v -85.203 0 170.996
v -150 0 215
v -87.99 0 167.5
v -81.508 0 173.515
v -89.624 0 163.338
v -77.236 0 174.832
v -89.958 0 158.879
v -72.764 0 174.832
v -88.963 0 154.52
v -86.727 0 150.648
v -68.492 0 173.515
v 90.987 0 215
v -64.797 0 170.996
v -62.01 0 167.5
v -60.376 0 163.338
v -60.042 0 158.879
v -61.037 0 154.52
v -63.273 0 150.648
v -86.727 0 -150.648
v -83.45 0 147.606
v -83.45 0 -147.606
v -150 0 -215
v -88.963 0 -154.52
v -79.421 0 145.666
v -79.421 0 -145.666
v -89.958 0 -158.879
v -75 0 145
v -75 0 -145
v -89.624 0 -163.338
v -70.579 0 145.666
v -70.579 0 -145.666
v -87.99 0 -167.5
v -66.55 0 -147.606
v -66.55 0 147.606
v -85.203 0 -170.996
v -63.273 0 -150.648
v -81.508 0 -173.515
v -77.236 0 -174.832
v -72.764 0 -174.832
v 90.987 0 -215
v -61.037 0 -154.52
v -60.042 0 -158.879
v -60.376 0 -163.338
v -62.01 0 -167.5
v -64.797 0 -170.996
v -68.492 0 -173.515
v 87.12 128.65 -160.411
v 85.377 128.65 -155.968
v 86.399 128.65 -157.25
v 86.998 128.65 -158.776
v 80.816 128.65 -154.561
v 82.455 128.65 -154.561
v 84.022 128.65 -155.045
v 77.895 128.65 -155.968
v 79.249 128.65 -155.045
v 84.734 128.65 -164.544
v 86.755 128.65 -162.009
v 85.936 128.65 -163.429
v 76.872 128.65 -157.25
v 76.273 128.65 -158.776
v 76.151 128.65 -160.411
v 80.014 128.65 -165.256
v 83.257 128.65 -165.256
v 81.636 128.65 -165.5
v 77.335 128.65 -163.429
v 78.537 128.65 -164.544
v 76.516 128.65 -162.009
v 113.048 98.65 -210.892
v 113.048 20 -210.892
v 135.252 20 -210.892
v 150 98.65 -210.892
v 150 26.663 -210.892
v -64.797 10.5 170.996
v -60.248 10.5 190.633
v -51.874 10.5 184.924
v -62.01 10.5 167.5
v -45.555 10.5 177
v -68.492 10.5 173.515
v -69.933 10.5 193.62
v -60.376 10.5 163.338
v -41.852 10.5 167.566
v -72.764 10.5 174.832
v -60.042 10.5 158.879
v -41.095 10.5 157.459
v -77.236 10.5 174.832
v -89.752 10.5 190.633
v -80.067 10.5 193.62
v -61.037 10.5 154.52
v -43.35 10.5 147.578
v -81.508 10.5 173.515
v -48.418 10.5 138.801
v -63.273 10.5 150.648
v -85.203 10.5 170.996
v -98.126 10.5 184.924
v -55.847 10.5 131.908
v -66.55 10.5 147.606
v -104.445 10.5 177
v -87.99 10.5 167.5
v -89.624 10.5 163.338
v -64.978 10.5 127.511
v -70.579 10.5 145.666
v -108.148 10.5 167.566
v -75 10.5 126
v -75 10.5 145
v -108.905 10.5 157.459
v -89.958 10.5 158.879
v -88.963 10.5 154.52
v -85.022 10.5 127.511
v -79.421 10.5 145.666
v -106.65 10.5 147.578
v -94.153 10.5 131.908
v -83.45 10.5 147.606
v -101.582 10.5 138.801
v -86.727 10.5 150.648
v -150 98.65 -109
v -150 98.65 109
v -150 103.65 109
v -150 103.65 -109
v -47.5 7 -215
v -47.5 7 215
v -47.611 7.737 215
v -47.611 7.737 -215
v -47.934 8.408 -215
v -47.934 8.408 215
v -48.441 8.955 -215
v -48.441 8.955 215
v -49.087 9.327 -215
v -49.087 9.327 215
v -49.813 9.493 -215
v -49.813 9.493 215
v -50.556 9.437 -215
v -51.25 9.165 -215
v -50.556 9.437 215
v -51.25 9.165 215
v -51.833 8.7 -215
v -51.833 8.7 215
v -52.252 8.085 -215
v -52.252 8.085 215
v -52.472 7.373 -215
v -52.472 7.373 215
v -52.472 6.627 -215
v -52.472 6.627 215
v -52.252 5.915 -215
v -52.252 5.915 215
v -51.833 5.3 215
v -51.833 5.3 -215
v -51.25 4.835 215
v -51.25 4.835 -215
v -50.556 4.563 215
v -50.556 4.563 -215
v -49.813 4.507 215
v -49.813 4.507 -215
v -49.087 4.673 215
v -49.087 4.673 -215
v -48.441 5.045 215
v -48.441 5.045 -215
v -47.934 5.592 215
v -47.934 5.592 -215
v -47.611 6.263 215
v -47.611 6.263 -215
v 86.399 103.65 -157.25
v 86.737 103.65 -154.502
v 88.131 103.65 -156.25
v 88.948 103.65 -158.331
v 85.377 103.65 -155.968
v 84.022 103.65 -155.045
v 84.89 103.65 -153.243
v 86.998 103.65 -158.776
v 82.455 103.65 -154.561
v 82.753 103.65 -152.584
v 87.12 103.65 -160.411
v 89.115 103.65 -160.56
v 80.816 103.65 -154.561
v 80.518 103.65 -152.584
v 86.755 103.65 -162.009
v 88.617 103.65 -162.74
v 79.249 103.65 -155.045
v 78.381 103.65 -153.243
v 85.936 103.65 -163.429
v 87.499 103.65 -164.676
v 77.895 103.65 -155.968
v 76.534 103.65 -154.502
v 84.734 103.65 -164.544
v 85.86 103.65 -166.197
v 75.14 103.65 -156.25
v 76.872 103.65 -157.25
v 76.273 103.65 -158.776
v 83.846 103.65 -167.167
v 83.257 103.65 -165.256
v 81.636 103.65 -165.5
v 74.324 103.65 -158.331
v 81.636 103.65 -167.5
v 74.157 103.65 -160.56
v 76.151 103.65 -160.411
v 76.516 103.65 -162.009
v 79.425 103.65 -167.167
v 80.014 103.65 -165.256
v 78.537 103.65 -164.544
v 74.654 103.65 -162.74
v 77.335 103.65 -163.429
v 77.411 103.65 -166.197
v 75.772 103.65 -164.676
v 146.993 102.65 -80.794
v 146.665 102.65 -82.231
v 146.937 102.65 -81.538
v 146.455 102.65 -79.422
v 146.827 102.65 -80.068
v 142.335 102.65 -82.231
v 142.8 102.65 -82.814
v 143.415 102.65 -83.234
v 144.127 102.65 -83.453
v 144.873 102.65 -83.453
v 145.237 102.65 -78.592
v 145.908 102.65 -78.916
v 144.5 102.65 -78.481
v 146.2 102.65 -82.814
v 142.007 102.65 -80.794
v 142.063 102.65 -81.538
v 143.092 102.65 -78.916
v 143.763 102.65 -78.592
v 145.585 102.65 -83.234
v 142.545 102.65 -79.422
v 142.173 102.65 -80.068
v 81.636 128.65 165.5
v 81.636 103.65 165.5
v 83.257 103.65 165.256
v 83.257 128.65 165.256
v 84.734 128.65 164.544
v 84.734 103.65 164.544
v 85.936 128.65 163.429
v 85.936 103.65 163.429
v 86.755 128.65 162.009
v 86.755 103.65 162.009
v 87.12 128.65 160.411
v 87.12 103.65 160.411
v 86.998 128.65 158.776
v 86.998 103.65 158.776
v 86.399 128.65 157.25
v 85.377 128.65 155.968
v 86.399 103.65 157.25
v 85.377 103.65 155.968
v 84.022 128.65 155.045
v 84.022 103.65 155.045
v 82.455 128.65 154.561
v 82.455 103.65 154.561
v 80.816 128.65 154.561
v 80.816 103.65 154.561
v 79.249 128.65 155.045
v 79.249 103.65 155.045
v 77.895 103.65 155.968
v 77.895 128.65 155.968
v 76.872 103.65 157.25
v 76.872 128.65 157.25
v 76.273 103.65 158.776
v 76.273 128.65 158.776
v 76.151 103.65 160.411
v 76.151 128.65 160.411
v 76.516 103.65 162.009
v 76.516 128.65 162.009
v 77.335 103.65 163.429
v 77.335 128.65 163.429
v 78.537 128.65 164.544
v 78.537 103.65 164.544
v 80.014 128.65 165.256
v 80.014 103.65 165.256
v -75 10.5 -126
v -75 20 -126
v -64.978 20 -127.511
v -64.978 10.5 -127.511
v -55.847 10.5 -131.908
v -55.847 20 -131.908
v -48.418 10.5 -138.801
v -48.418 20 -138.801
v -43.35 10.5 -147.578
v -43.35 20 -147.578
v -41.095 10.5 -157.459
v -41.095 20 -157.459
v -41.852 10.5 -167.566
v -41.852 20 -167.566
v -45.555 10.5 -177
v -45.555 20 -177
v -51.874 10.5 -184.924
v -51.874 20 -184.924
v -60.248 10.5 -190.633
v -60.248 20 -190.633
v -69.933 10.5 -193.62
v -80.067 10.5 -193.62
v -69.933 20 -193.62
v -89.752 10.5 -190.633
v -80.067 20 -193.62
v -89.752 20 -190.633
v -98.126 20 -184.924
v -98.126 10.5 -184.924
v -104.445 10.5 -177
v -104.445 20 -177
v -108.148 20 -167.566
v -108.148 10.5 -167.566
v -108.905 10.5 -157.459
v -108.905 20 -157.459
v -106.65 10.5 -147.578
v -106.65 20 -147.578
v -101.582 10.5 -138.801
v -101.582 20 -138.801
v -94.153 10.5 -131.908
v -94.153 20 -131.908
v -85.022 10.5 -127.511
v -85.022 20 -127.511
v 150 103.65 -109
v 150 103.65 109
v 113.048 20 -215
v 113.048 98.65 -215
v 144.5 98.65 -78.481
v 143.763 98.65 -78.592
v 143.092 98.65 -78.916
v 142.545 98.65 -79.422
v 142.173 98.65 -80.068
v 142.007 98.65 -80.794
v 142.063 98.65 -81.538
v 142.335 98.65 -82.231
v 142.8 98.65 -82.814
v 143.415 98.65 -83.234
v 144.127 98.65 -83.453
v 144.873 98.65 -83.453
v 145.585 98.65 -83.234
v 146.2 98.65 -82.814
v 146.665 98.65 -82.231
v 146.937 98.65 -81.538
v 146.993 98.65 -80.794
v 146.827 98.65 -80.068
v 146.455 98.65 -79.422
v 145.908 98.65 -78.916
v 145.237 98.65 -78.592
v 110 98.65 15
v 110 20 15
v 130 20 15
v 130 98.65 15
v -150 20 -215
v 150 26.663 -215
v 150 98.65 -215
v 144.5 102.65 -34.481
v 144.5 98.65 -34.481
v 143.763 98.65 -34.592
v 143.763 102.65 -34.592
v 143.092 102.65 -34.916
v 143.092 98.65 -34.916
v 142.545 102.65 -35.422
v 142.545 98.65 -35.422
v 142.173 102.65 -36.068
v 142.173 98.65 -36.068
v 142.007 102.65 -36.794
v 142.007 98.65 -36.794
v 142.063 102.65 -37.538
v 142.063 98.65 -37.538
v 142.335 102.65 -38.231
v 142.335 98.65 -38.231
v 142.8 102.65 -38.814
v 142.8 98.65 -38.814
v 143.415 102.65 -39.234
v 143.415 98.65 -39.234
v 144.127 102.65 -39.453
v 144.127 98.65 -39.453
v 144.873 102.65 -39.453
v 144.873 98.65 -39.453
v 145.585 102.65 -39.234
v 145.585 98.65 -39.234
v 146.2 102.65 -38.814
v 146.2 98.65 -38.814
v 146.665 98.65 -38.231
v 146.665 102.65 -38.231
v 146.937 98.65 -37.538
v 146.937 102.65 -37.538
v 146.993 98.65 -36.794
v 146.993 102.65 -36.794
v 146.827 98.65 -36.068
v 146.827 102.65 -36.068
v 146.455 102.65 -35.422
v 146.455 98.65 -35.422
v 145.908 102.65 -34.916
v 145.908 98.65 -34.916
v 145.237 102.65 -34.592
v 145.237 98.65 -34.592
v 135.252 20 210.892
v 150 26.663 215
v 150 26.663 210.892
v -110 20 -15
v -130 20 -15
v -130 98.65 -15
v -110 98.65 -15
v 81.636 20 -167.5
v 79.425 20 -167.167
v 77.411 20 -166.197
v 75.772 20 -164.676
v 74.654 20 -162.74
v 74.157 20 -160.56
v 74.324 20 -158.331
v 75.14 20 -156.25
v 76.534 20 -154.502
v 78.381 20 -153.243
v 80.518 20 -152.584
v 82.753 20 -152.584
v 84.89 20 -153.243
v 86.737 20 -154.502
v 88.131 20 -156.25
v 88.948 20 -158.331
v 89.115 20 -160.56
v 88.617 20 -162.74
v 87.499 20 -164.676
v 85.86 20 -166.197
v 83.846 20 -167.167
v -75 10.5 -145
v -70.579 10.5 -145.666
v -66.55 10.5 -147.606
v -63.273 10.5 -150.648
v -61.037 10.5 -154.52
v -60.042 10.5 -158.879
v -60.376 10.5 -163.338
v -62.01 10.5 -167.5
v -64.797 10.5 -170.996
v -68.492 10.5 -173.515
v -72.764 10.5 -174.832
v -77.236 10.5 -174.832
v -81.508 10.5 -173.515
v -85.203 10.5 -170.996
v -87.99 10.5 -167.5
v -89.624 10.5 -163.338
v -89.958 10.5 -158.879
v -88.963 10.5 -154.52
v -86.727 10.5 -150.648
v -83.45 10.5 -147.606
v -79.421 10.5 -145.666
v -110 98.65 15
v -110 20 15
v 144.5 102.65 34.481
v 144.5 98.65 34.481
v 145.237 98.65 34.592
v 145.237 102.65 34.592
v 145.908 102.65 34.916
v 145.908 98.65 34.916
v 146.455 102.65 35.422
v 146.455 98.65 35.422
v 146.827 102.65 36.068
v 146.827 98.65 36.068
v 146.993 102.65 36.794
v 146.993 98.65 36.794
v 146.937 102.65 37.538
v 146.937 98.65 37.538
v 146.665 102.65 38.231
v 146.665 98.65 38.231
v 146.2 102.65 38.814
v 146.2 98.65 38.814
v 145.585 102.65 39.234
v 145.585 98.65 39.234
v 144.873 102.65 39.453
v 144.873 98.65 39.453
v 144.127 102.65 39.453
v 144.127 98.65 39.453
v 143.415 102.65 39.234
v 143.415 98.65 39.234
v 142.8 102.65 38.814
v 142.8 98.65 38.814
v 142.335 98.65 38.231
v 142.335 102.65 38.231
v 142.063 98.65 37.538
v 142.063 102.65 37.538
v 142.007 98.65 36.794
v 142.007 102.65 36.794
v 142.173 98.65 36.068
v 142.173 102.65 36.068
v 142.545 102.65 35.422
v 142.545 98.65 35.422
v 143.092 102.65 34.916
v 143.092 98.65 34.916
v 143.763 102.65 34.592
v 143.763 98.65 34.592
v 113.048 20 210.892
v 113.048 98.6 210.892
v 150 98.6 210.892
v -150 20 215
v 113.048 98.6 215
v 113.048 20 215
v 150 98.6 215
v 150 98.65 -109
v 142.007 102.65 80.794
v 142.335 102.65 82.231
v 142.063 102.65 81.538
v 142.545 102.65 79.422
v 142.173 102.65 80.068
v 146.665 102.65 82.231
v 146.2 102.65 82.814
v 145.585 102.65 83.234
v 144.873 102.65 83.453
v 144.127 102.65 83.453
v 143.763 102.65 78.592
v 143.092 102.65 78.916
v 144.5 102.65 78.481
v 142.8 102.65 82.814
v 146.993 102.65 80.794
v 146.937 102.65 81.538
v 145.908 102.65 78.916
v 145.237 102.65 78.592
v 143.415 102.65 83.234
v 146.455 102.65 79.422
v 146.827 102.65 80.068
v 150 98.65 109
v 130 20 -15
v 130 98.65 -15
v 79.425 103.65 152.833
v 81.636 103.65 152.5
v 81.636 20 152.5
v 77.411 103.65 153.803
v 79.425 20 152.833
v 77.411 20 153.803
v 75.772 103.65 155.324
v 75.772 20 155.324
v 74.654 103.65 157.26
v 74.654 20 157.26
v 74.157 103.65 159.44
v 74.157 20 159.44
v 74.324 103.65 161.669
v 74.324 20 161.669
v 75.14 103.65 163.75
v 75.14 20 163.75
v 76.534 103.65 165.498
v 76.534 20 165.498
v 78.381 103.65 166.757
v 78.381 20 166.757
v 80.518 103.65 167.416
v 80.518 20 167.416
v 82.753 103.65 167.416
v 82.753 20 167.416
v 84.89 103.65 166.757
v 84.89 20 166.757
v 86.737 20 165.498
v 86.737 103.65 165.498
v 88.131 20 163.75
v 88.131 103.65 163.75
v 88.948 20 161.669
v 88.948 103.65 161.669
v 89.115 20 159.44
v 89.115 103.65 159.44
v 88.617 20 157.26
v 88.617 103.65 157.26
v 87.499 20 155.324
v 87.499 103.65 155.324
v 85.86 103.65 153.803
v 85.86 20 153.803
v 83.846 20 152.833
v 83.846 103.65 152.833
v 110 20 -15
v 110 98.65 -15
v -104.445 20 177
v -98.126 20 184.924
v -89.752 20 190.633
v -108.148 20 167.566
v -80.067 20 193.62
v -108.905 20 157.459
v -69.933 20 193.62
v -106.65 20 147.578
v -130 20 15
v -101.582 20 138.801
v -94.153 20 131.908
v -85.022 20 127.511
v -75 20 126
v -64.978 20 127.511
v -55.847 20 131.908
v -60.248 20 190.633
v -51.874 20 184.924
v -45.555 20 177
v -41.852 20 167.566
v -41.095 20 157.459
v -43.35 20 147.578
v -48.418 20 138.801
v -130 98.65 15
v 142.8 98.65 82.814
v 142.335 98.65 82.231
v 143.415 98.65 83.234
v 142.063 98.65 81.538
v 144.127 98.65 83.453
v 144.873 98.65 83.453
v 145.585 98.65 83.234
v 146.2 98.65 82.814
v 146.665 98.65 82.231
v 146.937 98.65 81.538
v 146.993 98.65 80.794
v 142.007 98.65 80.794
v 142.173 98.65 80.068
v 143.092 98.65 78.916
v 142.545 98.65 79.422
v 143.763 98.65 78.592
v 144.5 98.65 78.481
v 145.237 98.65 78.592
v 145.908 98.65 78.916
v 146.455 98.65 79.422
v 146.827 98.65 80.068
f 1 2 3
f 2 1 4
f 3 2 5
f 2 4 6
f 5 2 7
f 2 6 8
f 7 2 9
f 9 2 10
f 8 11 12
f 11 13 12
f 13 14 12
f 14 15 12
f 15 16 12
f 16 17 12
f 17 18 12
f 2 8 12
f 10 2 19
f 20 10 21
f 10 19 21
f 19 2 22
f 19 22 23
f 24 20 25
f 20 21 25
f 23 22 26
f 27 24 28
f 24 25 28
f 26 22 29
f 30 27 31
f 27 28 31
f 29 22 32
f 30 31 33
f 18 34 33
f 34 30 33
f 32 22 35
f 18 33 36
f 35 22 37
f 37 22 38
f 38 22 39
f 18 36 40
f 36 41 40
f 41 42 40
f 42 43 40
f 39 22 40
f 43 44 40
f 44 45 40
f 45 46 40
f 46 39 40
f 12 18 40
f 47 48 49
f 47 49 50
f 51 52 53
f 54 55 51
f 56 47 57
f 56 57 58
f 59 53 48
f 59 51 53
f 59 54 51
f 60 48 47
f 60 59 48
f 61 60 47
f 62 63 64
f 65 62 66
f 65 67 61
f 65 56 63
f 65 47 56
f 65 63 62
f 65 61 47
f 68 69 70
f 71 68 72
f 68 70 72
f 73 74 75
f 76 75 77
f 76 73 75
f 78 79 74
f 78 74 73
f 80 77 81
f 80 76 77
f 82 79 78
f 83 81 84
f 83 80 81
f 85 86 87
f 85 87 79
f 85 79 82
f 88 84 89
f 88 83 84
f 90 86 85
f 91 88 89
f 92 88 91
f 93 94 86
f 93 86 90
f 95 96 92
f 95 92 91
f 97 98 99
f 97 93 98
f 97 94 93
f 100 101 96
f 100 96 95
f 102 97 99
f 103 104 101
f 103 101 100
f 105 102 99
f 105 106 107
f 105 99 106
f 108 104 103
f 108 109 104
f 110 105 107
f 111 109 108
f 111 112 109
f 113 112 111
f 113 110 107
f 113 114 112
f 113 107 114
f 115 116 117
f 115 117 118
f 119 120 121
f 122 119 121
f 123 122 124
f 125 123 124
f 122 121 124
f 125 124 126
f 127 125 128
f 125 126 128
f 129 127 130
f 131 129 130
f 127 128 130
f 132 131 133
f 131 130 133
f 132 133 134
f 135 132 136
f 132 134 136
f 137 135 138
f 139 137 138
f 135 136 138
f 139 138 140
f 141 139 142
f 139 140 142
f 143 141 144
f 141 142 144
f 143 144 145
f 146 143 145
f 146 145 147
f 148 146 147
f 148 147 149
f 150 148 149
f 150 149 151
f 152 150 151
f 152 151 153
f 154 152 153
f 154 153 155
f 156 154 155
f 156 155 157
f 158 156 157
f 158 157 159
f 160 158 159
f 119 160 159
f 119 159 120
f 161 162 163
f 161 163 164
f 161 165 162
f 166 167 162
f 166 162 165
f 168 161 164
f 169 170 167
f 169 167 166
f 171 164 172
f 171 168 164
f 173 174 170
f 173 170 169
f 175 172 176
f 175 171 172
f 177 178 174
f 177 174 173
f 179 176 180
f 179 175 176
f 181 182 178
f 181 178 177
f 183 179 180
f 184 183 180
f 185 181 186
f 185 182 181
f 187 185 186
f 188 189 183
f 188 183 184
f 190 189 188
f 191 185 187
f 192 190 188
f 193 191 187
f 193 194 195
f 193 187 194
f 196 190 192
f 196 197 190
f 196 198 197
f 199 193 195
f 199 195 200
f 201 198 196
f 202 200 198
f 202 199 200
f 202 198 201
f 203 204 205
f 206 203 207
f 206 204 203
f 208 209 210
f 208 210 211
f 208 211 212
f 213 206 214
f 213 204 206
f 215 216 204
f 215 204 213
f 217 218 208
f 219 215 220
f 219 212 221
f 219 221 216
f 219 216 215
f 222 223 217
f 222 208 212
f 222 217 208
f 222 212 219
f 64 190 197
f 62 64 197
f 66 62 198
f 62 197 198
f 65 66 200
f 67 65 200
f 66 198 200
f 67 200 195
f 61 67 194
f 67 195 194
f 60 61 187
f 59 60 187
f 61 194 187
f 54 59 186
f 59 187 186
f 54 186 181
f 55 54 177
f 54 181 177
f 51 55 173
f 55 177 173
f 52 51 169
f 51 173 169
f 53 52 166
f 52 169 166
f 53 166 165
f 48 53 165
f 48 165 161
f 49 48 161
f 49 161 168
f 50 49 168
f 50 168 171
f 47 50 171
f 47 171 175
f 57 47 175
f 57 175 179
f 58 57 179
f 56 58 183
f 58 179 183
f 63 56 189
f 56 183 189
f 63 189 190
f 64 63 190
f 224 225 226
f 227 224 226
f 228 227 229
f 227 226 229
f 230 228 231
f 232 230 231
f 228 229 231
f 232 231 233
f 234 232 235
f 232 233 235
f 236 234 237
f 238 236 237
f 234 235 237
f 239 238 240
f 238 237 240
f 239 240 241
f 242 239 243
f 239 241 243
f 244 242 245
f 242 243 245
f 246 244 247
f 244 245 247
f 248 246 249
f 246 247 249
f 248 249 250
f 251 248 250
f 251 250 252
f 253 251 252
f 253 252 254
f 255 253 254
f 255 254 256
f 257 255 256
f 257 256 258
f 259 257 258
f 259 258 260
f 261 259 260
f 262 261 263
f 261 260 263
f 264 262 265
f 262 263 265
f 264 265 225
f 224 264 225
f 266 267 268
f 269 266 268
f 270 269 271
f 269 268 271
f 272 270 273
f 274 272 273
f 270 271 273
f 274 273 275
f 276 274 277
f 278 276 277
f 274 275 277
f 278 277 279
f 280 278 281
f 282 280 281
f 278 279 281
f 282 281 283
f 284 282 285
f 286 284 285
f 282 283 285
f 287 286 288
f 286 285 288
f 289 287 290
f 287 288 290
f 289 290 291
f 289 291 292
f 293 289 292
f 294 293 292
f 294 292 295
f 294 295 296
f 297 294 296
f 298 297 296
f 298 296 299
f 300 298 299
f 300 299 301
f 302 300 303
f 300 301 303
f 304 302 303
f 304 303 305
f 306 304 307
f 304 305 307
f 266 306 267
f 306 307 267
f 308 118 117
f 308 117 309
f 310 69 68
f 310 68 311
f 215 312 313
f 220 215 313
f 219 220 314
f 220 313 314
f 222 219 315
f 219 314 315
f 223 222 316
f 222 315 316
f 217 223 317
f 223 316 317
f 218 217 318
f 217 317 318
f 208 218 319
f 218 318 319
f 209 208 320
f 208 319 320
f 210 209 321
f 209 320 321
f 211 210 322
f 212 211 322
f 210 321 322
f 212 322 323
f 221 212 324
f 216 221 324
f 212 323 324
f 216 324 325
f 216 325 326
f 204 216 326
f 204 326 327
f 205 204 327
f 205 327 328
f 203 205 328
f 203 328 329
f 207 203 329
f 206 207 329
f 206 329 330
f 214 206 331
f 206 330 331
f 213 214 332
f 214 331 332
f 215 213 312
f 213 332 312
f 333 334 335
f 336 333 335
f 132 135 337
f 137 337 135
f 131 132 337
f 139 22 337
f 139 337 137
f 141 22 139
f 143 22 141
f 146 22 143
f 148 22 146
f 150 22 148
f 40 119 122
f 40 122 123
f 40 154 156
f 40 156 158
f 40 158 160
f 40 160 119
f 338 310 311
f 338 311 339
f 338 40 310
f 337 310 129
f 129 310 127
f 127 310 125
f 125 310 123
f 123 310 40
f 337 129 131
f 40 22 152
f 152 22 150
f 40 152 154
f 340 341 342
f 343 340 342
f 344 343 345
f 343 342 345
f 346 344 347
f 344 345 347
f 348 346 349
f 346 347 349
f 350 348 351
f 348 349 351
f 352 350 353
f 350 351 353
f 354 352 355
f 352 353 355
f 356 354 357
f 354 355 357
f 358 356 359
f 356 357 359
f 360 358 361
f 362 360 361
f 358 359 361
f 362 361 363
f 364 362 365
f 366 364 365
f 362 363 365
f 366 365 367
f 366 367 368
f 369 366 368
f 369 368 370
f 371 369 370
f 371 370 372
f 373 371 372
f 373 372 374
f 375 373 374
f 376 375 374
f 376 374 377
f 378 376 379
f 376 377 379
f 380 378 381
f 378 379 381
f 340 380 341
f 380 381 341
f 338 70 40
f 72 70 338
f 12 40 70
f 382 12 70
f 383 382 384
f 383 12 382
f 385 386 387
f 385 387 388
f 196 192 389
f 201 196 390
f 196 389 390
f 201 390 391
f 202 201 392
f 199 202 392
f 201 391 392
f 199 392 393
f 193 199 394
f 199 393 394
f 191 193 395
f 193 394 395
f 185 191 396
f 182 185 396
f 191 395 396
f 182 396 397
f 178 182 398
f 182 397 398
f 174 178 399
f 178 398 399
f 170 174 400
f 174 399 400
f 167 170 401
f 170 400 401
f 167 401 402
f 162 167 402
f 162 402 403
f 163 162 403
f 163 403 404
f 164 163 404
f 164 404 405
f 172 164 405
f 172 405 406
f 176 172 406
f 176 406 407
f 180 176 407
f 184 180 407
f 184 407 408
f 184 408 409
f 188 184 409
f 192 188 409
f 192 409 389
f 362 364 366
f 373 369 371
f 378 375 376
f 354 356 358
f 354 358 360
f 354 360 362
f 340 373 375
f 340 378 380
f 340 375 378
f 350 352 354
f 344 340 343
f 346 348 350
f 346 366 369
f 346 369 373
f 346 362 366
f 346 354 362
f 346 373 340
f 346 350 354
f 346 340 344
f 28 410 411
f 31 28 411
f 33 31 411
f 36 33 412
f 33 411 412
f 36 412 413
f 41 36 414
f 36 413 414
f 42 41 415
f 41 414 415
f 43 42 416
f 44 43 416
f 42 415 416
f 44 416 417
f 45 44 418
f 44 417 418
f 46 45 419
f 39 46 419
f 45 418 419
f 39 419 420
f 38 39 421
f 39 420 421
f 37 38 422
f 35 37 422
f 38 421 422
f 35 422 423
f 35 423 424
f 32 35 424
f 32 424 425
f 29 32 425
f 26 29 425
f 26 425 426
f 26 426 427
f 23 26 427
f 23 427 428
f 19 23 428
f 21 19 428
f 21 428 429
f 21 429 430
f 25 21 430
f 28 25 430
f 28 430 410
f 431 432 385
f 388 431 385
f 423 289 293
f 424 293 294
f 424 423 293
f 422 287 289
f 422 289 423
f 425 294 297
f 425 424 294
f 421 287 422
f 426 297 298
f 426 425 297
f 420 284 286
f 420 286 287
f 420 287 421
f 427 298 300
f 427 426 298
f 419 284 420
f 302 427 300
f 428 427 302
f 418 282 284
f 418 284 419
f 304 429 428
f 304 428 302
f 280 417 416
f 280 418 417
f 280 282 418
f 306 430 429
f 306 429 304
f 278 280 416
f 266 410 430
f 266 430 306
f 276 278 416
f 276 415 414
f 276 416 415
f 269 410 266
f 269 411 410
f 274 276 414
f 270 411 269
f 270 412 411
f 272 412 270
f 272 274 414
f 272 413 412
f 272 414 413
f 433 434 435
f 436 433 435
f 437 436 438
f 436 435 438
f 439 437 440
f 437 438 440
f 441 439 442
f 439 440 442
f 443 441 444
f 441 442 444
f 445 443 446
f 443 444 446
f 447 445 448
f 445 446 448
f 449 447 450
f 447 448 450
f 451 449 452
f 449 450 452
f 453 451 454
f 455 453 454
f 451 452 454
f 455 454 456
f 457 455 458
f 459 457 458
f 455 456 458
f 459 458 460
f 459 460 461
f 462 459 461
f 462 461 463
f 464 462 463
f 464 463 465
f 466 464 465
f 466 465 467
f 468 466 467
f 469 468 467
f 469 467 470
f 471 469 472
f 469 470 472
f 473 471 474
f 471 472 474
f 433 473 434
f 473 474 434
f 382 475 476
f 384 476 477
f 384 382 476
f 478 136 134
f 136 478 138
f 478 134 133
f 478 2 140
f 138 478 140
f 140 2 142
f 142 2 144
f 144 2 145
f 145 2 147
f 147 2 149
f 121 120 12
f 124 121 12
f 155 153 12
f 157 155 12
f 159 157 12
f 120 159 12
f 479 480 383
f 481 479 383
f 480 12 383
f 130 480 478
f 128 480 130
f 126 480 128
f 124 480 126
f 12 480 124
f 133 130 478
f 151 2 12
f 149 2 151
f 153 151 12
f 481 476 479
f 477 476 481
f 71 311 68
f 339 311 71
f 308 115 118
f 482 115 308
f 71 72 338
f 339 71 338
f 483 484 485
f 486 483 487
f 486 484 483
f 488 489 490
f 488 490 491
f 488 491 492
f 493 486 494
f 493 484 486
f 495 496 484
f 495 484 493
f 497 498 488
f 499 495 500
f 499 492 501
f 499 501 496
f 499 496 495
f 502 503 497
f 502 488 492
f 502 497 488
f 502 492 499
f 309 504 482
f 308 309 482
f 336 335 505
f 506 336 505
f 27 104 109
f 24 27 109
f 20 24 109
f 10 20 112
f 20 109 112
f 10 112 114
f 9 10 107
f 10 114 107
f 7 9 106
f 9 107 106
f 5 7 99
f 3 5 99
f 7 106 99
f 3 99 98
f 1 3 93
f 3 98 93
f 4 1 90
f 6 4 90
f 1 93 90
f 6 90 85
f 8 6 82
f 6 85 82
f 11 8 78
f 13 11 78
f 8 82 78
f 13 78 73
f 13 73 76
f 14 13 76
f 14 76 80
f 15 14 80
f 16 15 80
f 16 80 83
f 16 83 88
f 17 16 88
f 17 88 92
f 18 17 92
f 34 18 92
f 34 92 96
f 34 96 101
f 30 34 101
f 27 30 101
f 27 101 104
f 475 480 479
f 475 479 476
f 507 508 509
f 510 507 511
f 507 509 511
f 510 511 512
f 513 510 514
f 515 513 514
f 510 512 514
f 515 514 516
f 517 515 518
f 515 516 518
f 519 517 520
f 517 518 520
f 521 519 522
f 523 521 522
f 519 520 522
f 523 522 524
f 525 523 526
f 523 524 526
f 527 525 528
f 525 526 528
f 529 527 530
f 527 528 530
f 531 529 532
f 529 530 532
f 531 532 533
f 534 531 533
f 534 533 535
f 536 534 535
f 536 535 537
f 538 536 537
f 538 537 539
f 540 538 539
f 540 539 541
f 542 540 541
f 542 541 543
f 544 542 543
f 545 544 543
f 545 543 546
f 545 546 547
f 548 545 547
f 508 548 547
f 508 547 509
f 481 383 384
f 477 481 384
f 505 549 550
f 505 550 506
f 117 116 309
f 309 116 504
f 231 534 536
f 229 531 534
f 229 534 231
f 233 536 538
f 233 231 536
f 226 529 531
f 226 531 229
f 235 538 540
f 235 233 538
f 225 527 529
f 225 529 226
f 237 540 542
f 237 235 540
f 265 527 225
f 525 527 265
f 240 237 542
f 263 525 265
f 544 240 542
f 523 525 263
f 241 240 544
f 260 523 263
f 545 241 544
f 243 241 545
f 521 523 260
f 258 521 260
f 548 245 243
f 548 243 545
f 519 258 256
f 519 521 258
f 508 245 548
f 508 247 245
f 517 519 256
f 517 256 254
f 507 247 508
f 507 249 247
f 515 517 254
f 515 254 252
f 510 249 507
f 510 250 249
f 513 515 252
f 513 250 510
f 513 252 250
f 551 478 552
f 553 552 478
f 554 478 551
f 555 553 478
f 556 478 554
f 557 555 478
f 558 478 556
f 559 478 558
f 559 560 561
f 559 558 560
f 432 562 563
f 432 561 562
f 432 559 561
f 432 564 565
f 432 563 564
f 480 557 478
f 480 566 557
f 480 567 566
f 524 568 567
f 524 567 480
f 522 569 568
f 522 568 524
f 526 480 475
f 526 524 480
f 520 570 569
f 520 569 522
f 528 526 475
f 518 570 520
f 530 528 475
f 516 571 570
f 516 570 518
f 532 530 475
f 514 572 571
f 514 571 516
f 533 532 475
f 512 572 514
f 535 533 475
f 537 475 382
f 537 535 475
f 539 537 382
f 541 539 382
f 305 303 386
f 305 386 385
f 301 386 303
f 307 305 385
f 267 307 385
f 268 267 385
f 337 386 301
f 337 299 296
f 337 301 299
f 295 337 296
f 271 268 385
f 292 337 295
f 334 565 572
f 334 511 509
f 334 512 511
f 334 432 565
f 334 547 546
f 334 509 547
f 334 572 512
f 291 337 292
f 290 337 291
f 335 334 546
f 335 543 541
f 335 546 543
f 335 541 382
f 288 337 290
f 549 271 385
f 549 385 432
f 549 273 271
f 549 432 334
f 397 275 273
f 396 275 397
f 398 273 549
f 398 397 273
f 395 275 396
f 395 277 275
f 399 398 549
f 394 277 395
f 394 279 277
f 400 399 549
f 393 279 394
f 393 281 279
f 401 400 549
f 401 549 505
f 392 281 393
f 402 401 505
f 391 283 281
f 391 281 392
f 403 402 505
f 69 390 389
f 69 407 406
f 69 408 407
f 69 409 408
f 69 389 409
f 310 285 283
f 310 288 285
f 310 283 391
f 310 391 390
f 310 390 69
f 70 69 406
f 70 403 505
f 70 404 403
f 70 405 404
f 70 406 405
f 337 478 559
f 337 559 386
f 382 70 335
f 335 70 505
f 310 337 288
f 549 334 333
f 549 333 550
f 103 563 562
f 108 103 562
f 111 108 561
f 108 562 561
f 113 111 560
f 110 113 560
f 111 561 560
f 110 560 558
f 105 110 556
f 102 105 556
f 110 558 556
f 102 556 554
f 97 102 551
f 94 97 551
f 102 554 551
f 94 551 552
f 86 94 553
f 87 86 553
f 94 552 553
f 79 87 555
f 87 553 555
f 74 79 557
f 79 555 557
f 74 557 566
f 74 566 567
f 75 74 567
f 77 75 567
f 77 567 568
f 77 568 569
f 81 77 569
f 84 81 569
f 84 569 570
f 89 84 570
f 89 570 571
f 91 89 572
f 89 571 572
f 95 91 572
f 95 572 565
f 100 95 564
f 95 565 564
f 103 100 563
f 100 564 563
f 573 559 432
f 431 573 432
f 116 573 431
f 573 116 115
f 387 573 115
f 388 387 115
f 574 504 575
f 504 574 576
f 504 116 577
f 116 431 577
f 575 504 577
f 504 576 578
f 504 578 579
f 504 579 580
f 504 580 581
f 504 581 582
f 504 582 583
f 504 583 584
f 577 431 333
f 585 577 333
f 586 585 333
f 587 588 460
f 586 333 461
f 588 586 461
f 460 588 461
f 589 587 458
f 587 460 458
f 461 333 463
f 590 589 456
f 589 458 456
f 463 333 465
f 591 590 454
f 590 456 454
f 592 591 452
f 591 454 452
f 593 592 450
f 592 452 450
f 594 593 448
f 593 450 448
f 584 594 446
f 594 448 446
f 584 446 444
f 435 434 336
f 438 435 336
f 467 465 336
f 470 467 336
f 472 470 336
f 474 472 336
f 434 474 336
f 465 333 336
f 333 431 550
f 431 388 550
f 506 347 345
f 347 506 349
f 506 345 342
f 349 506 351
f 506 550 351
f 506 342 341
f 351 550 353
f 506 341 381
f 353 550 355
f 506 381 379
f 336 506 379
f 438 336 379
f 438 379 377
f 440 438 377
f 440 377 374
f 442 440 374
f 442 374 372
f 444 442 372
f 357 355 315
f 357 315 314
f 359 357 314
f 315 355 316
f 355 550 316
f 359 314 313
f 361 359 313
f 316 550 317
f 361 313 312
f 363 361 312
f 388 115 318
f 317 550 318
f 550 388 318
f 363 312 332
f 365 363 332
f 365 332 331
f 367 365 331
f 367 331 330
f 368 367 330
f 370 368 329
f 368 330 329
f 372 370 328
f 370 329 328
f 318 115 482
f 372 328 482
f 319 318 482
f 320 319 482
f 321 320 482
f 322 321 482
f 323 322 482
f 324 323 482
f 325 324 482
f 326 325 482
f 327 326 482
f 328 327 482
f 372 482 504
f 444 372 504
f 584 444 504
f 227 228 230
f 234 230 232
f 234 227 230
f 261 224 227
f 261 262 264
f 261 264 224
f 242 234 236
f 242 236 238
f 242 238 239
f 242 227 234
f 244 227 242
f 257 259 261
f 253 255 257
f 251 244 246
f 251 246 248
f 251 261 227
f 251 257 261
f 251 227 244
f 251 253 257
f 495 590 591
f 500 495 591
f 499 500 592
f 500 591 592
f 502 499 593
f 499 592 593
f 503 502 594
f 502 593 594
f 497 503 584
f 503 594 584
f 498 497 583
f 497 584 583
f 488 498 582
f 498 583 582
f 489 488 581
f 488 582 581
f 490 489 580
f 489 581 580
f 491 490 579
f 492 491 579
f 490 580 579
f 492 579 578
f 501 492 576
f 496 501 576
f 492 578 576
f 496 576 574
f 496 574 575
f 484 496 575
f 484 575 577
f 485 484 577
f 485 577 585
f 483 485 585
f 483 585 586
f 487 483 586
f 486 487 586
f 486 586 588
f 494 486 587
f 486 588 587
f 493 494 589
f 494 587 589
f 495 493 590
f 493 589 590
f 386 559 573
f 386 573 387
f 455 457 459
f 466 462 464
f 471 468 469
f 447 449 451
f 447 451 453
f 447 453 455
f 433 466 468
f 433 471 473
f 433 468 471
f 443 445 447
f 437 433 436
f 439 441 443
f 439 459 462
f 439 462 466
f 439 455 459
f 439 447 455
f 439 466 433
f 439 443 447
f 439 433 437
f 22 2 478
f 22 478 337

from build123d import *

# Parameters (mm, degrees)
SKETCH2_W           = 300
SKETCH2_H           = 430
BOSS_EXTRUDE1_DEPTH = 20
SKETCH3_R           = 15
CUT_EXTRUDE1_DEPTH  = 20
SKETCH4_R           = 34
CUT_EXTRUDE2_DEPTH  = 9.5
SKETCH5_R           = 7.5
BOSS_EXTRUDE2_DEPTH = 108.65
CUT_EXTRUDE4_START  = -25
SKETCH6_R           = 7.5
SKETCH6_R_2         = 5.5
CUT_EXTRUDE4_DEPTH  = 25
SKETCH7_W           = 20
SKETCH7_H           = 30
BOSS_EXTRUDE3_DEPTH = 78.65
SKETCH8_W           = 300
SKETCH8_H           = 218
BOSS_EXTRUDE4_DEPTH = 5
SKETCH12_R          = 2.5
CUT_EXTRUDE7_DEPTH  = 4
SKETCH13_W          = 36.95235035
SKETCH13_H          = 4.108205057
BOSS_EXTRUDE5_DEPTH = 78.6
SKETCH15_W          = 36.95235035
SKETCH15_H          = 4.108205057
BOSS_EXTRUDE6_DEPTH = 78.65
CUT_EXTRUDE8_DEPTH  = 474.234426579
SKETCH17_R          = 2.5
CUT_EXTRUDE9_DEPTH  = 474.234426579


with BuildPart() as part:
    # Sketch2 → Boss-Extrude1 (new body)
    with BuildSketch(Plane(origin=(0, 0, 0), x_dir=(1, 0, 0), z_dir=(0, 1, 0))):
        Rectangle(SKETCH2_W, SKETCH2_H)
    extrude(amount=BOSS_EXTRUDE1_DEPTH)

    # Sketch3 → Cut-Extrude1 (cut)
    with BuildSketch(Plane(origin=(0, 20, 0), x_dir=(1, 0, 0), z_dir=(0, 1, 0))):
        with Locations(Location((-75, 160, 0), (0, 0, 270))):
            Circle(SKETCH3_R)
        with Locations(Location((-75, -160, 0), (0, 0, 90))):
            Circle(SKETCH3_R)
    extrude(amount=-CUT_EXTRUDE1_DEPTH, mode=Mode.SUBTRACT)

    # Sketch4 → Cut-Extrude2 (cut)
    with BuildSketch(Plane(origin=(0, 20, 0), x_dir=(1, 0, 0), z_dir=(0, 1, 0))):
        with Locations(Location((-75, 160, 0), (0, 0, 270))):
            Circle(SKETCH4_R)
        with Locations(Location((-75, -160, 0), (0, 0, 90))):
            Circle(SKETCH4_R)
    extrude(amount=-CUT_EXTRUDE2_DEPTH, mode=Mode.SUBTRACT)

    # Sketch5 → Boss-Extrude2 (add)
    with BuildSketch(Plane(origin=(0, 20, 0), x_dir=(1, 0, 0), z_dir=(0, 1, 0))):
        with Locations(Location((81.635568617, 160, 0), (0, 0, 90))):
            Circle(SKETCH5_R)
        with Locations(Location((81.635568617, -160, 0), (0, 0, 90))):
            Circle(SKETCH5_R)
    extrude(amount=BOSS_EXTRUDE2_DEPTH)

    # Sketch6 → Cut-Extrude4 (cut)
    # profile 1 of 2: a face of its own
    with BuildSketch(Plane(origin=(0, 128.65, 0), x_dir=(1, 0, 0), z_dir=(0, 1, 0)).offset(CUT_EXTRUDE4_START)):
        with Locations(Location((81.635568617, -160, 0), (0, 0, 90))):
            Circle(SKETCH6_R)
        with Locations(Location((81.635568617, -160, 0), (0, 0, 270))):
            Circle(SKETCH6_R_2, mode=Mode.SUBTRACT)
    # profile 2 of 2: a face of its own
    with BuildSketch(Plane(origin=(0, 128.65, 0), x_dir=(1, 0, 0), z_dir=(0, 1, 0)).offset(CUT_EXTRUDE4_START)):
        with Locations(Location((81.635568617, 160, 0), (0, 0, 90))):
            Circle(SKETCH6_R)
        with Locations(Location((81.635568617, 160, 0), (0, 0, 90))):
            Circle(SKETCH6_R_2, mode=Mode.SUBTRACT)
    extrude(amount=CUT_EXTRUDE4_DEPTH, mode=Mode.SUBTRACT)

    # Sketch7 → Boss-Extrude3 (add)
    with BuildSketch(Plane(origin=(0, 20, 0), x_dir=(1, 0, 0), z_dir=(0, 1, 0))):
        with Locations((120, 0)):
            Rectangle(SKETCH7_W, SKETCH7_H)
        with Locations((-120, 0)):
            Rectangle(SKETCH7_W, SKETCH7_H)
    extrude(amount=BOSS_EXTRUDE3_DEPTH)

    # Sketch8 → Boss-Extrude4 (add)
    with BuildSketch(Plane(origin=(0, 98.65, 0), x_dir=(1, 0, 0), z_dir=(0, 1, 0))):
        Rectangle(SKETCH8_W, SKETCH8_H)
    extrude(amount=BOSS_EXTRUDE4_DEPTH)

    # Sketch12 → Cut-Extrude7 (cut)
    with BuildSketch(Plane.XZ.offset(-98.65)):
        with Locations(Location((144.5, 80.981198611, 0), (0, 0, 270))):
            Circle(SKETCH12_R)
        with Locations(Location((144.5, 36.981198611, 0), (0, 0, 270))):
            Circle(SKETCH12_R)
        with Locations(Location((144.5, -80.981198611, 0), (0, 0, 90))):
            Circle(SKETCH12_R)
        with Locations(Location((144.5, -36.981198611, 0), (0, 0, 90))):
            Circle(SKETCH12_R)
    extrude(amount=-CUT_EXTRUDE7_DEPTH, mode=Mode.SUBTRACT)

    # Sketch13 → Boss-Extrude5 (add)
    with BuildSketch(Plane(origin=(0, 20, 0), x_dir=(1, 0, 0), z_dir=(0, 1, 0))):
        with Locations((131.523824825, -212.945897472)):
            Rectangle(SKETCH13_W, SKETCH13_H)
    extrude(amount=BOSS_EXTRUDE5_DEPTH)

    # Sketch15 → Boss-Extrude6 (add)
    with BuildSketch(Plane(origin=(0, 20, 0), x_dir=(1, 0, 0), z_dir=(0, 1, 0))):
        with Locations((131.523824825, 212.945897472)):
            Rectangle(SKETCH15_W, SKETCH15_H)
    extrude(amount=BOSS_EXTRUDE6_DEPTH)

    # Sketch16 → Cut-Extrude8 (cut, through all)
    with BuildSketch(Plane.XY.offset(215)):
        Polygon((90.986671156, 0), (150, 26.663239915), (150, 0), align=None)
    extrude(amount=-CUT_EXTRUDE8_DEPTH, mode=Mode.SUBTRACT)

    # Sketch17 → Cut-Extrude9 (cut, through all)
    with BuildSketch(Plane.XY.offset(215)):
        with Locations((-50, 7)):
            Circle(SKETCH17_R)
    extrude(amount=-CUT_EXTRUDE9_DEPTH, mode=Mode.SUBTRACT)


solid = part.part
